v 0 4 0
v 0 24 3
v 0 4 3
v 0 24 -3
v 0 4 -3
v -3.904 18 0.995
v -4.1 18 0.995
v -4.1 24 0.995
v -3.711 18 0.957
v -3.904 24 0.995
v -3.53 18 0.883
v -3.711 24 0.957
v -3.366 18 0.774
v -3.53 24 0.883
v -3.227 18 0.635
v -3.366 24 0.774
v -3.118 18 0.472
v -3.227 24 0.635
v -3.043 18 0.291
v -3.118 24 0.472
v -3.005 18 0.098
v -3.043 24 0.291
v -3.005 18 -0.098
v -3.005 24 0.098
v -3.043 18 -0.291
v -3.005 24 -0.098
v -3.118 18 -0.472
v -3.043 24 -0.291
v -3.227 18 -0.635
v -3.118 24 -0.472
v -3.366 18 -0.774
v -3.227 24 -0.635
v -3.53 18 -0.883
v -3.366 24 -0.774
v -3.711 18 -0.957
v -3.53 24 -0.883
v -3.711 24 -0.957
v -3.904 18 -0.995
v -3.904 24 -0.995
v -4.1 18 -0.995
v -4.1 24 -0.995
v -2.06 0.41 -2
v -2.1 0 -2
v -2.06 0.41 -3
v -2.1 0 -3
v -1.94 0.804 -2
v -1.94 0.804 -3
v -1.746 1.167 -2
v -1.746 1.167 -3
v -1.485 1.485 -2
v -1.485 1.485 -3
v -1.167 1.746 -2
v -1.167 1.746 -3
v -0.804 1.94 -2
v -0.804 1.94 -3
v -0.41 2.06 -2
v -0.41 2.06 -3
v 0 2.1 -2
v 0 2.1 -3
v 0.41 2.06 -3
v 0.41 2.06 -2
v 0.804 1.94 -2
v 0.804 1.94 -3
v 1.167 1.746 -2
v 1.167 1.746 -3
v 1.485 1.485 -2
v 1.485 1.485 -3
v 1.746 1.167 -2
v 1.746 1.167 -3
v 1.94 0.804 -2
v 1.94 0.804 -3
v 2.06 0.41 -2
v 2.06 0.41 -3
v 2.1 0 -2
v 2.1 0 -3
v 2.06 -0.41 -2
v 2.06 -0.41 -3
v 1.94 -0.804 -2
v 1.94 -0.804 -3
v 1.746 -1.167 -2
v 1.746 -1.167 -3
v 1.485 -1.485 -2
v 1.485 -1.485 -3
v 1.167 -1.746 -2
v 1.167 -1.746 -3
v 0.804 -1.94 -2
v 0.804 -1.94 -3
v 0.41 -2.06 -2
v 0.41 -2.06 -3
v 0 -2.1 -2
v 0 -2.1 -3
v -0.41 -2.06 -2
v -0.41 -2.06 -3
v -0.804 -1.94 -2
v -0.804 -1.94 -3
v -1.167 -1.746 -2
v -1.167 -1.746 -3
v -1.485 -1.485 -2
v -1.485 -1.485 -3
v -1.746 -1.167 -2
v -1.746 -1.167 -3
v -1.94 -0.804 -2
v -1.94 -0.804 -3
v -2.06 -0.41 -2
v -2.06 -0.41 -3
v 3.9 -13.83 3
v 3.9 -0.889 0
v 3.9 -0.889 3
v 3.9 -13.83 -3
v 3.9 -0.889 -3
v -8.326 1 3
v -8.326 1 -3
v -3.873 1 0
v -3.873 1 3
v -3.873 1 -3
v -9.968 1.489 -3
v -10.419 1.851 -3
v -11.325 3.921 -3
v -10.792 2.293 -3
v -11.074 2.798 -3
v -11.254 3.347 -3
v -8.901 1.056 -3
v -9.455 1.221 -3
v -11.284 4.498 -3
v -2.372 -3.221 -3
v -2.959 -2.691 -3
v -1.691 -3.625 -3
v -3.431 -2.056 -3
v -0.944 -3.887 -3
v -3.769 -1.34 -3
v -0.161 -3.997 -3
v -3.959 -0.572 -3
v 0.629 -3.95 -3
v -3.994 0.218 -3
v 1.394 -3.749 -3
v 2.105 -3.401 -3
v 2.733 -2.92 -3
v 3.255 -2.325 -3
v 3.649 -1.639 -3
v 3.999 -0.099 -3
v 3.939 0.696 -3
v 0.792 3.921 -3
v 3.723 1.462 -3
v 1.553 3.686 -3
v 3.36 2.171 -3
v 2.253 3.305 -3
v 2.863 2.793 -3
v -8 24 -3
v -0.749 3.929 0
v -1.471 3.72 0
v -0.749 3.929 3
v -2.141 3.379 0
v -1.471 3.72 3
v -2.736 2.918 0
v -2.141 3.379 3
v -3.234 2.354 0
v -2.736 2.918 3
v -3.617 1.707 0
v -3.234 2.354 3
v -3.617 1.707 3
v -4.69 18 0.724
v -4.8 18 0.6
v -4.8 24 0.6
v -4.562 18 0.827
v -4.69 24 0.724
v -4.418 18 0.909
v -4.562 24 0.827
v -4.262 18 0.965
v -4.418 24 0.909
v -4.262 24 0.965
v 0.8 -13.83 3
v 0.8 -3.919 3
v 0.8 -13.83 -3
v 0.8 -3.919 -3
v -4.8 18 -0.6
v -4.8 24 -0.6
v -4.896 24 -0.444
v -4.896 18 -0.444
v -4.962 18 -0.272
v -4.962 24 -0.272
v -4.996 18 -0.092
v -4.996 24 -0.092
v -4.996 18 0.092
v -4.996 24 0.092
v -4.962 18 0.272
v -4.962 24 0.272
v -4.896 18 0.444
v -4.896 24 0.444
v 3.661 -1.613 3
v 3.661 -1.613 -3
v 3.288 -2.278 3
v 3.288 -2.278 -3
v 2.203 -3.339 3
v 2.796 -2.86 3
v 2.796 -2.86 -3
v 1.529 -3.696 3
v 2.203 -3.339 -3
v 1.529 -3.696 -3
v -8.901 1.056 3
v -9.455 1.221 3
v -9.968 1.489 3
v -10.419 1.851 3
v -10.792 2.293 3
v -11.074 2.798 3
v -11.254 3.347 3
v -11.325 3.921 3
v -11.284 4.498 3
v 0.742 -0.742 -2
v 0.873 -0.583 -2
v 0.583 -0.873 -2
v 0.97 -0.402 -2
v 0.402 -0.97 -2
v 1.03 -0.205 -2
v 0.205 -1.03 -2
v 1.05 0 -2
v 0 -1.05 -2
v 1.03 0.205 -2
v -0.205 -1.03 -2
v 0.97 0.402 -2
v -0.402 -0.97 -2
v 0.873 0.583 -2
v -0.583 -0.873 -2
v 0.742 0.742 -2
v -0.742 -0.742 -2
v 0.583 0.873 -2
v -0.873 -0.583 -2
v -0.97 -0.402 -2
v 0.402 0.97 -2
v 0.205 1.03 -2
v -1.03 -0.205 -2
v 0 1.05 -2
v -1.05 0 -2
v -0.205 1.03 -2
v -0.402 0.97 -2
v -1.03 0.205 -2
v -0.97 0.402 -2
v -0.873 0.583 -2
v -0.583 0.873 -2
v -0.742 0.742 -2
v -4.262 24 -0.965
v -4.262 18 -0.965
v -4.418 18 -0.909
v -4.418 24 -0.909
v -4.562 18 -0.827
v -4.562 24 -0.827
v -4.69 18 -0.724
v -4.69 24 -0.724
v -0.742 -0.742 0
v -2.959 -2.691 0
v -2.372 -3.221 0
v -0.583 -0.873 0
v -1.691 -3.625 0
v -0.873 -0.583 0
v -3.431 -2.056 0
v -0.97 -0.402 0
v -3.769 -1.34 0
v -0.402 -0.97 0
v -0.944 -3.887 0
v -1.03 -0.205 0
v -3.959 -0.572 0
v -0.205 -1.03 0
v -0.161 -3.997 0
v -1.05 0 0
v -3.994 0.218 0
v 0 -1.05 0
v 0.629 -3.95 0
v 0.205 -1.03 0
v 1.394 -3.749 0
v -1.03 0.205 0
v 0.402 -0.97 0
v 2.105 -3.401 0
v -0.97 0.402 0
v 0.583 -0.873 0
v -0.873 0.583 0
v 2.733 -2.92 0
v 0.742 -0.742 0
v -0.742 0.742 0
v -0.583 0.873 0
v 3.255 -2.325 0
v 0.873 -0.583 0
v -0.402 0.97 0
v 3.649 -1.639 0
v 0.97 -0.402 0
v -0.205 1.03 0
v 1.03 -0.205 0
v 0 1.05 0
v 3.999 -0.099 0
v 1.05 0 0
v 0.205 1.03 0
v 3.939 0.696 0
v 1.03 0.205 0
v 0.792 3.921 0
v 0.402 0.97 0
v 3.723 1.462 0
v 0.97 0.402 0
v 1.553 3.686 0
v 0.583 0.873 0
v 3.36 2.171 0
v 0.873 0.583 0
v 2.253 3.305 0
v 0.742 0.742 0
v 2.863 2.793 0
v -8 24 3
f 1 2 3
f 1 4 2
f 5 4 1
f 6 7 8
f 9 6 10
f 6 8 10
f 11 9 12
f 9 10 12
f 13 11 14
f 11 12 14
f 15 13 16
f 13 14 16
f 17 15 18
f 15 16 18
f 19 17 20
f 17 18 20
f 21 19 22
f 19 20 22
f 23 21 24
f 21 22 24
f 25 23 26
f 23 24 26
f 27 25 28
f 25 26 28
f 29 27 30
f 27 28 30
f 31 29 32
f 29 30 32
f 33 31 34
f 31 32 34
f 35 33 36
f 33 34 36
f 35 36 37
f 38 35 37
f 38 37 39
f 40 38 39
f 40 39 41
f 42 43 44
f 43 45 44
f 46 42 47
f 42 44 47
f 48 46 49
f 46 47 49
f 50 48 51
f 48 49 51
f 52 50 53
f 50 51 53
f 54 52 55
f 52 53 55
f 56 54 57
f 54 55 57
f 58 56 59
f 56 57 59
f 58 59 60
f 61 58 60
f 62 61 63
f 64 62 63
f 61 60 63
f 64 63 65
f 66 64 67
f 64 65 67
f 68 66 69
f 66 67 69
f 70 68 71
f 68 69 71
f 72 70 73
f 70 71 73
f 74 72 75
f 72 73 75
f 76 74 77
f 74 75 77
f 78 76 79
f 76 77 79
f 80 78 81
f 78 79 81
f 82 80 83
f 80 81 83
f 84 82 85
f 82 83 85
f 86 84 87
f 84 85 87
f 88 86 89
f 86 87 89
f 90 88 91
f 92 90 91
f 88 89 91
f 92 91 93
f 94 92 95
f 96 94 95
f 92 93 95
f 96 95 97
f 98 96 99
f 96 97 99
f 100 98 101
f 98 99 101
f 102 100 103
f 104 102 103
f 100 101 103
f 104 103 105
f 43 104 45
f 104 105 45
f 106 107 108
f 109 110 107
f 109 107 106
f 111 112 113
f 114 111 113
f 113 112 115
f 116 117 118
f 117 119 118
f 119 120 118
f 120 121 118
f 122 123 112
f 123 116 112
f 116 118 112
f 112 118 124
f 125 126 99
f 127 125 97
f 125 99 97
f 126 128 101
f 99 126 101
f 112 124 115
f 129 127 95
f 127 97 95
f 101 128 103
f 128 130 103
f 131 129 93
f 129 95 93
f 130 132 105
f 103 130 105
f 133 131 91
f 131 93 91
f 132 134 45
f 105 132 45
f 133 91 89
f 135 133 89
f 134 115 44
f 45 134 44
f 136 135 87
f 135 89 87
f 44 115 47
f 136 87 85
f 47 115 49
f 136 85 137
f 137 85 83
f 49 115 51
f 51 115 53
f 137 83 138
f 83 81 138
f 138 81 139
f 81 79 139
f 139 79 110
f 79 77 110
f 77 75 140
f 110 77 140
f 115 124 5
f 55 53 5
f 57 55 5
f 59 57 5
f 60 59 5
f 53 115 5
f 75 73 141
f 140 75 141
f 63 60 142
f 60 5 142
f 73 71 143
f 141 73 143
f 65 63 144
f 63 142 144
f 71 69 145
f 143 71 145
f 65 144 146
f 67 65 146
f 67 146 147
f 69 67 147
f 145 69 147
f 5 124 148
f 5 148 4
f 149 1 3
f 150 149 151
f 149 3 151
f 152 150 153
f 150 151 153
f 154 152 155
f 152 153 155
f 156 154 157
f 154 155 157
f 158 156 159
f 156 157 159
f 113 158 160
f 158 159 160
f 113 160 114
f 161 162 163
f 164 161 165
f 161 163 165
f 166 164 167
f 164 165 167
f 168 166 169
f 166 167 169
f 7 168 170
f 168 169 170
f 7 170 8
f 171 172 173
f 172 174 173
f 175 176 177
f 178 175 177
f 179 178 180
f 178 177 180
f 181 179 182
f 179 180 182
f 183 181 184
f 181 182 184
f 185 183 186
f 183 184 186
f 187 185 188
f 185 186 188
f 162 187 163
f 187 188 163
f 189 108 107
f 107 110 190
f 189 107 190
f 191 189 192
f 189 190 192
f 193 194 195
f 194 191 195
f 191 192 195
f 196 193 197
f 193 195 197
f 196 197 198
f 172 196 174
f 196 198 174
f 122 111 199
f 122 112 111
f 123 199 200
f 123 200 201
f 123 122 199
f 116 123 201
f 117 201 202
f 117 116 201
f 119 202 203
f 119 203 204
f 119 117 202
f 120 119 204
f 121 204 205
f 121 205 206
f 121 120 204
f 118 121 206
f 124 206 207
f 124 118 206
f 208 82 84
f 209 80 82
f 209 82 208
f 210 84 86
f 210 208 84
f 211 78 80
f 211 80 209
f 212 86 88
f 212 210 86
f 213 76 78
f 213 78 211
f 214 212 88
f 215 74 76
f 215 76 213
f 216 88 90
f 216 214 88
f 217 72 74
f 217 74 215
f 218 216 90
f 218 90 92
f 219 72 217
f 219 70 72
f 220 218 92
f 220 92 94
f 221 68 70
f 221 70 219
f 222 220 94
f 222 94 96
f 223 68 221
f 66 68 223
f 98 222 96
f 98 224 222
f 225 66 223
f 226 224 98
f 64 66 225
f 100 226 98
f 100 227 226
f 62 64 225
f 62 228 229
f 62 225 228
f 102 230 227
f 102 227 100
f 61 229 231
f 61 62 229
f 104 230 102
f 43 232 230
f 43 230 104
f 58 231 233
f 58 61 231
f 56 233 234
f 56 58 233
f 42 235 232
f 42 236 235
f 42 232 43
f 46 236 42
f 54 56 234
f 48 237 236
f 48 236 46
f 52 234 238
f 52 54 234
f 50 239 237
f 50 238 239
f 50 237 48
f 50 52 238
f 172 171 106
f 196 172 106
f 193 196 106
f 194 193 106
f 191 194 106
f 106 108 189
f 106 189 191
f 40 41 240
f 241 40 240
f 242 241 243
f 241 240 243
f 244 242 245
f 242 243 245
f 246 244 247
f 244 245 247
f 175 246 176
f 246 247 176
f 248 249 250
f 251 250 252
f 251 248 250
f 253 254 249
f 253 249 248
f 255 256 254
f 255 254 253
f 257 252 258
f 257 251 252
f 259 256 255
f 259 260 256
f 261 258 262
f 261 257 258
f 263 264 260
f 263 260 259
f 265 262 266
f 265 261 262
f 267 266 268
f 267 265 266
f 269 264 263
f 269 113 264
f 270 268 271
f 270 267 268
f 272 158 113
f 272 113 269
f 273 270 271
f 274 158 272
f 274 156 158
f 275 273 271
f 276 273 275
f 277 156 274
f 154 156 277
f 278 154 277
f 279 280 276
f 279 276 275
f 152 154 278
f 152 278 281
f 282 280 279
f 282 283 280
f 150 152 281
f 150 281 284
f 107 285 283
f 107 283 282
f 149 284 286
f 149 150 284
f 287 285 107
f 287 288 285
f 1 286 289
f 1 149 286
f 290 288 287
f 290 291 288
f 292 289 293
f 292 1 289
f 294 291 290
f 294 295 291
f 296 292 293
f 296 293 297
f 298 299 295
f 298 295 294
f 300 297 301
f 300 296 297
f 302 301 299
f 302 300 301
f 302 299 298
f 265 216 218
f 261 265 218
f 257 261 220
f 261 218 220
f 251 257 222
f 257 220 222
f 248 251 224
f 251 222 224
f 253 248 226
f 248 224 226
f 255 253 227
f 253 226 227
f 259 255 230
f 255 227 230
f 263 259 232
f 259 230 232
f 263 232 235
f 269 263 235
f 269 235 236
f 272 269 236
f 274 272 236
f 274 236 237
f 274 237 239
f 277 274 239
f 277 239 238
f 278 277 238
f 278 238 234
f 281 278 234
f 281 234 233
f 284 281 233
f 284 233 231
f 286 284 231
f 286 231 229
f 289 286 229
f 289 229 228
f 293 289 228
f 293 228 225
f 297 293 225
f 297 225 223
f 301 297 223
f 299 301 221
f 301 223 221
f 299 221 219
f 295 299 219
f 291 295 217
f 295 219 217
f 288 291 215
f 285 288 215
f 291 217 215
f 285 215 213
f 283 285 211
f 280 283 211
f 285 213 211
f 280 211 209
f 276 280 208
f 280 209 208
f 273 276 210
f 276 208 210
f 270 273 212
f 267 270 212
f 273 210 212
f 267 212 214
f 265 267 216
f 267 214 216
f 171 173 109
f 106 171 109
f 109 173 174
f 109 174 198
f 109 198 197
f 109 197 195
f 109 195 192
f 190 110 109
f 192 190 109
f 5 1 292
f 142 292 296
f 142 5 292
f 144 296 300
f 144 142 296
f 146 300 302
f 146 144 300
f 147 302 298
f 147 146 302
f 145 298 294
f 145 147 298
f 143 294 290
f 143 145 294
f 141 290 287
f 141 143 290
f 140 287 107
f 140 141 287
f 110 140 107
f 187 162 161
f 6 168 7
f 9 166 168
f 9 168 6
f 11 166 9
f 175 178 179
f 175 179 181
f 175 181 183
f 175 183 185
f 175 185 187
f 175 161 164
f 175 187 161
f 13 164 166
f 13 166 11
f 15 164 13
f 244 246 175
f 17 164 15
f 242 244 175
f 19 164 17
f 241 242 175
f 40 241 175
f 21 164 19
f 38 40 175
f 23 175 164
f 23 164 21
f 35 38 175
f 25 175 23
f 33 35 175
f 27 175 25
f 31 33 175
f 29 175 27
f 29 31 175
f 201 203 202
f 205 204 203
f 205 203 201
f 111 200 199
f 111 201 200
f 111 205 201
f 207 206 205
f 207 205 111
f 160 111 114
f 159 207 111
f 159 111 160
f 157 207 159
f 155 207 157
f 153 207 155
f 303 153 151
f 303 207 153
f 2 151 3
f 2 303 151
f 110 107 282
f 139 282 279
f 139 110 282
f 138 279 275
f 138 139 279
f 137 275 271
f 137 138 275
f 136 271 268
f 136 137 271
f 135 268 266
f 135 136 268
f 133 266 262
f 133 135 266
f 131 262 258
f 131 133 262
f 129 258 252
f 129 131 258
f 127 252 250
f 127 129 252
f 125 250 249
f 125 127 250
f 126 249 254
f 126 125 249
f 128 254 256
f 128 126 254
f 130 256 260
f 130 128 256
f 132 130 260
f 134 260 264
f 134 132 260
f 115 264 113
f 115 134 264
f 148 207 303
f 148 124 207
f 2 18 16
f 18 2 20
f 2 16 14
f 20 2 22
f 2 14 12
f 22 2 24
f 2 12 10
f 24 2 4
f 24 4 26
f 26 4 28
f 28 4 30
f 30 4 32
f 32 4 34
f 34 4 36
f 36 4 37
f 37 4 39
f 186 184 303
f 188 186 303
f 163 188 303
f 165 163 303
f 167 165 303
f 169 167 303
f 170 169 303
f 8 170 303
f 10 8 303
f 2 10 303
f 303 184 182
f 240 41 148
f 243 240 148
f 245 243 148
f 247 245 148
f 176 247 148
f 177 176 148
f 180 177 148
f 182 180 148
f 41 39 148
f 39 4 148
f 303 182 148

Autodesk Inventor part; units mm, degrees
ref_plane "YZ Plane" through (0, 0, 0) normal (1, 0, 0) x (0, 1, 0)
ref_plane "XZ Plane" through (0, 0, 0) normal (0, 1, 0) x (-1, 0, 0)
ref_plane "XY Plane" through (0, 0, 0) normal (0, 0, 1) x (1, 0, 0)
sketch "Sketch1" plane through (0, 0, 0) normal (0, 0, 1) x (1, 0, 0)
  circle A0 centre (0, 0) radius 4
  line L0 (0, 24) -> (-8, 24)
  line L1 (0, 24) -> (0, 4)
  line L2 (-11.873, 1) -> (-3.873, 1)
  line L3 (-11.873, 1) -> (-8, 24)
  dimension "d0" = 8
  dimension "d6" = 8
  dimension "d60" = 20
  dimension "d61" = 8
extrude "Extrusion1" add sketch "Sketch1" along normal mid plane 6
sketch "Sketch2" plane through (0, 0, 3) normal (0, 0, 1) x (1, 0, 0)
  circle A0 centre (0, 0) radius 4
extrude "Extrusion2" cut sketch "Sketch2" against normal blind 3
sketch "Sketch4" plane through (-8, 24, 3) normal (0, 1, 0) x (1, 0, 0)
  line L0 (8, 6) -> (8, 0) projected
  line L1 (0, 0) -> (8, 6)
  line L2 (8, 0) -> (0, 0) projected
  line L3 (0, 6) -> (0, 0) projected
  line L4 (8, 0) -> (0, 6)
  line L5 (0, 6) -> (8, 6) projected
  line L6 (4, 6) -> (4, 0)
  arc A0 (3.9001, 2.005) -> (3.9001, 3.995) centre (4, 3) ccw
  arc A1 (3.9001, 3.995) -> (3.2, 3.6) centre (4, 3) ccw
  arc A2 (3.2, 2.4) -> (3.9001, 2.005) centre (4, 3) ccw
  arc A3 (3.2, 3.6) -> (3.2, 2.4) centre (4, 3) ccw
  point P0 (8, 3)
extrude "Extrusion4" cut sketch "Sketch4" against normal blind 6 contours A0 L4 L1 | L1 L6 A0 | A0 L6 L4 | L6 A0 A2 L1 | L1 A3 L4 | L4 A1 A0 L6
sketch "Sketch8" plane through (0, 0, 0) normal (0, 0, 1) x (1, 0, 0)
  arc A0 (-3.873, 1) -> (0, 4) centre (0, 0) ccw projected
hole "Hole3" at (0, 0, 0) direction (0, 0, -1) diameter 2.1 end through all
sketch "Sketch9" plane through (0, 0, 0) normal (0, 0, 1) x (1, 0, 0)
  line L0 (0, 4) -> (0, 24) construction
  line L1 (0, 24) -> (-8, 24) construction
  line L2 (-3.2679, 22.7321) -> (-9.2774, 0.3045) construction
  line L3 (-11.873, 1) -> (-3.873, 1) construction
  arc A0 (0, 4) -> (-3.873, 1) centre (0, 0) ccw construction
  arc A1 (-3.873, 1) -> (0, 4) centre (0, 0) ccw projected
  line L4 (0, 26.7661) -> (0, -20.5966) construction
  arc A2 (-3.873, 1) -> (0, 4) centre (0, 0) ccw construction
  line L5 (0.8, -3.9192) -> (0.8, -8.9192)
  line L6 (3.9, -0.8888) -> (3.9, -5.8888)
  line L7 (3.9, -5.8888) -> (3.9, -13.8305)
  line L8 (0.8, -8.9192) -> (0.8, -13.8305)
  line L9 (0.8, -13.8305) -> (3.9, -13.8305)
  point P0 (3.9, -0.8888)
  dimension "d42" = 5
  dimension "d43" = 0.8
  dimension "d49" = 5
  dimension "d56" = 3.1
  dimension "d57" = 9.9113
extrude "Extrusion5" add sketch "Sketch9" along normal mid plane 6
sketch "Sketch10" plane through (0, 0, -3) normal (0, 0, -1) x (-1, 0, 0)
  circle A0 centre (0, 0) radius 2.1
  circle A1 centre (0, 0) radius 1.05 projected
  circle A2 centre (0, 0) radius 1.05 projected
  line L0 (0, 24) -> (0, 4) projected
  arc A3 (0, 4) -> (-3.9, -0.8888) centre (0, 0) ccw projected
  line L1 (3.873, 1) -> (11.873, 1) projected
  line L2 (8, 24) -> (0, 24) projected
  line L3 (-3.9, -0.8888) -> (-3.9, -13.8305) projected
  line L4 (-0.8, -13.8305) -> (-0.8, -3.9192) projected
  arc A4 (-0.8, -3.9192) -> (3.873, 1) centre (0, 0) ccw projected
  line L5 (-3.9, -13.8305) -> (-0.8, -13.8305) projected
  line L6 (11.873, 1) -> (8, 24) projected
  dimension "d52" = 4.2
extrude "Extrusion6" cut sketch "Sketch10" against normal blind 1 contours A0
fillet "Fillet4" radius 3 1 edges at (-11.873, 1, 0)
properties part number "pliers" material "ABS Plastic"
